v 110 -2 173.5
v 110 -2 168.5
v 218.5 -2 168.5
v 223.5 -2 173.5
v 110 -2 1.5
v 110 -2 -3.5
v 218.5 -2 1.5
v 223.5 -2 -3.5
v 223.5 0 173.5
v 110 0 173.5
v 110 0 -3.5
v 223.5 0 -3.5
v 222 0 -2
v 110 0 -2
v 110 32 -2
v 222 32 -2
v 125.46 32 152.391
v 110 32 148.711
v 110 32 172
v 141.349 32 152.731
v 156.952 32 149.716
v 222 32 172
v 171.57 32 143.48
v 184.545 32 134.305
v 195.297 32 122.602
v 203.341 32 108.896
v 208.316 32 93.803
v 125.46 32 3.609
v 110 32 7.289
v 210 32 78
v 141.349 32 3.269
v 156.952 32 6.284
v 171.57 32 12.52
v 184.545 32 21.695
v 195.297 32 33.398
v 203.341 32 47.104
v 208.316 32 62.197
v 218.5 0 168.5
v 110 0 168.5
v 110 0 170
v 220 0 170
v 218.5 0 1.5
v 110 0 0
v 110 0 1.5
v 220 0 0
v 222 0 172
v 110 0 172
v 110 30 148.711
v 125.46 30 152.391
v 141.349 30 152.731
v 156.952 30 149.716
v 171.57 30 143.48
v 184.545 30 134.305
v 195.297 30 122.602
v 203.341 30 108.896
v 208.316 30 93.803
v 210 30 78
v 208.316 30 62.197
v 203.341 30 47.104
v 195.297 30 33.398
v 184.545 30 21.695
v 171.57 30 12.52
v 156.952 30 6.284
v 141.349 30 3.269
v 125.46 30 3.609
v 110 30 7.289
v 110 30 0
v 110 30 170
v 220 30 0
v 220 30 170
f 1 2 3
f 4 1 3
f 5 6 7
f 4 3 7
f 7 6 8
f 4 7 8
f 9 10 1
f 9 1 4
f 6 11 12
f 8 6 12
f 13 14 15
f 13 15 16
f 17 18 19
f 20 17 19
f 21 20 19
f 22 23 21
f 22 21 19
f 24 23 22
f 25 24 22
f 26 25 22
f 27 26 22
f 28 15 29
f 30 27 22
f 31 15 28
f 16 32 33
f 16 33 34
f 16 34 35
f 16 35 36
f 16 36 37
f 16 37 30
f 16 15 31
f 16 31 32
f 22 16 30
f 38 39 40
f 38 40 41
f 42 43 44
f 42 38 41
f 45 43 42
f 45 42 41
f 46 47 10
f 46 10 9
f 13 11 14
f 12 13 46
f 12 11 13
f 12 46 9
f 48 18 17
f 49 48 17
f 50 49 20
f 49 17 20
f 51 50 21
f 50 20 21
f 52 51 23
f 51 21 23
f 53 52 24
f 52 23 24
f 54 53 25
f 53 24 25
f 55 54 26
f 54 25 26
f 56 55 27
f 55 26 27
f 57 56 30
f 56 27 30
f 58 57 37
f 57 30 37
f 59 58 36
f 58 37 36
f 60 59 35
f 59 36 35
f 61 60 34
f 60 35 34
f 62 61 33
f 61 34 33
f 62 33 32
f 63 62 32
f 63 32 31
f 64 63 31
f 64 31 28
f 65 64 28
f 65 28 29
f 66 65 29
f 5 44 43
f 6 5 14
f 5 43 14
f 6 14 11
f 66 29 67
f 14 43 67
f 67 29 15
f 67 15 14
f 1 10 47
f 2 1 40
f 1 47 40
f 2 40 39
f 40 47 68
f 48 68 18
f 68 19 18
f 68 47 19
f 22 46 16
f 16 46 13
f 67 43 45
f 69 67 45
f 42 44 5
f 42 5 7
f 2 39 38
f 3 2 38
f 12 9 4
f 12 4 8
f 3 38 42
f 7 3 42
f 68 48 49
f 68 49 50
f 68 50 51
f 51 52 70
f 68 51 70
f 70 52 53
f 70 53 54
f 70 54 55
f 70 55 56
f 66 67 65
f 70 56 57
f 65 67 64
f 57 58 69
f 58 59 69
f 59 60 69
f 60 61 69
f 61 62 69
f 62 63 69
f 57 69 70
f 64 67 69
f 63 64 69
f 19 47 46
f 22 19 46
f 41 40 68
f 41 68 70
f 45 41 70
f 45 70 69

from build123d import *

# Parameters (mm, degrees)
SKETCH_1_W          = 224
SKETCH_1_H          = 174
SKETCH_1_W_2        = 220
SKETCH_1_H_2        = 170
EXTRUDE_1_DEPTH     = 32
SKETCH_2_W          = 227
SKETCH_2_H          = 177
SKETCH_2_W_2        = 217
SKETCH_2_H_2        = 167
EXTRUDE_2_DEPTH     = 2
SKETCH_3_W          = 222
SKETCH_3_H          = 172
SKETCH_3_R          = 75
EXTRUDE_3_DEPTH     = 2
SKETCH_4_W          = 113.5
SKETCH_4_H          = 177
CUT_EXTRUDE_1_DEPTH = 285.974560268


with BuildPart() as part:
    # 草图1 → 凸台-拉伸1 (new body)
    with BuildSketch(Plane(origin=(0, 0, 0), x_dir=(1, 0, 0), z_dir=(0, 1, 0))):
        with Locations((110, -85)):
            Rectangle(SKETCH_1_W, SKETCH_1_H)
        with Locations((110, -85)):
            Rectangle(SKETCH_1_W_2, SKETCH_1_H_2, mode=Mode.SUBTRACT)
    extrude(amount=EXTRUDE_1_DEPTH)

    # 草图2 → 凸台-拉伸2 (add)
    with BuildSketch(Plane(origin=(0, 0, 0), x_dir=(1, 0, 0), z_dir=(0, 1, 0))):
        with Locations((110, -85)):
            Rectangle(SKETCH_2_W, SKETCH_2_H)
        with Locations((110, -85)):
            Rectangle(SKETCH_2_W_2, SKETCH_2_H_2, mode=Mode.SUBTRACT)
    extrude(amount=-EXTRUDE_2_DEPTH)

    # 草图3 → 凸台-拉伸3 (add)
    with BuildSketch(Plane(origin=(0, 32, 0), x_dir=(1, 0, 0), z_dir=(0, 1, 0))):
        with Locations((109, -84)):
            Rectangle(SKETCH_3_W, SKETCH_3_H)
        with Locations(Location((135, -78, 0), (0, 0, 270))):
            Circle(SKETCH_3_R, mode=Mode.SUBTRACT)
    extrude(amount=-EXTRUDE_3_DEPTH)

    # 草图4 → 切除-拉伸1 (cut, through all)
    with BuildSketch(Plane(origin=(0, 32, 0), x_dir=(1, 0, 0), z_dir=(0, 1, 0))):
        with Locations((53.25, -85)):
            Rectangle(SKETCH_4_W, SKETCH_4_H)
    extrude(amount=-CUT_EXTRUDE_1_DEPTH, mode=Mode.SUBTRACT)


solid = part.part
